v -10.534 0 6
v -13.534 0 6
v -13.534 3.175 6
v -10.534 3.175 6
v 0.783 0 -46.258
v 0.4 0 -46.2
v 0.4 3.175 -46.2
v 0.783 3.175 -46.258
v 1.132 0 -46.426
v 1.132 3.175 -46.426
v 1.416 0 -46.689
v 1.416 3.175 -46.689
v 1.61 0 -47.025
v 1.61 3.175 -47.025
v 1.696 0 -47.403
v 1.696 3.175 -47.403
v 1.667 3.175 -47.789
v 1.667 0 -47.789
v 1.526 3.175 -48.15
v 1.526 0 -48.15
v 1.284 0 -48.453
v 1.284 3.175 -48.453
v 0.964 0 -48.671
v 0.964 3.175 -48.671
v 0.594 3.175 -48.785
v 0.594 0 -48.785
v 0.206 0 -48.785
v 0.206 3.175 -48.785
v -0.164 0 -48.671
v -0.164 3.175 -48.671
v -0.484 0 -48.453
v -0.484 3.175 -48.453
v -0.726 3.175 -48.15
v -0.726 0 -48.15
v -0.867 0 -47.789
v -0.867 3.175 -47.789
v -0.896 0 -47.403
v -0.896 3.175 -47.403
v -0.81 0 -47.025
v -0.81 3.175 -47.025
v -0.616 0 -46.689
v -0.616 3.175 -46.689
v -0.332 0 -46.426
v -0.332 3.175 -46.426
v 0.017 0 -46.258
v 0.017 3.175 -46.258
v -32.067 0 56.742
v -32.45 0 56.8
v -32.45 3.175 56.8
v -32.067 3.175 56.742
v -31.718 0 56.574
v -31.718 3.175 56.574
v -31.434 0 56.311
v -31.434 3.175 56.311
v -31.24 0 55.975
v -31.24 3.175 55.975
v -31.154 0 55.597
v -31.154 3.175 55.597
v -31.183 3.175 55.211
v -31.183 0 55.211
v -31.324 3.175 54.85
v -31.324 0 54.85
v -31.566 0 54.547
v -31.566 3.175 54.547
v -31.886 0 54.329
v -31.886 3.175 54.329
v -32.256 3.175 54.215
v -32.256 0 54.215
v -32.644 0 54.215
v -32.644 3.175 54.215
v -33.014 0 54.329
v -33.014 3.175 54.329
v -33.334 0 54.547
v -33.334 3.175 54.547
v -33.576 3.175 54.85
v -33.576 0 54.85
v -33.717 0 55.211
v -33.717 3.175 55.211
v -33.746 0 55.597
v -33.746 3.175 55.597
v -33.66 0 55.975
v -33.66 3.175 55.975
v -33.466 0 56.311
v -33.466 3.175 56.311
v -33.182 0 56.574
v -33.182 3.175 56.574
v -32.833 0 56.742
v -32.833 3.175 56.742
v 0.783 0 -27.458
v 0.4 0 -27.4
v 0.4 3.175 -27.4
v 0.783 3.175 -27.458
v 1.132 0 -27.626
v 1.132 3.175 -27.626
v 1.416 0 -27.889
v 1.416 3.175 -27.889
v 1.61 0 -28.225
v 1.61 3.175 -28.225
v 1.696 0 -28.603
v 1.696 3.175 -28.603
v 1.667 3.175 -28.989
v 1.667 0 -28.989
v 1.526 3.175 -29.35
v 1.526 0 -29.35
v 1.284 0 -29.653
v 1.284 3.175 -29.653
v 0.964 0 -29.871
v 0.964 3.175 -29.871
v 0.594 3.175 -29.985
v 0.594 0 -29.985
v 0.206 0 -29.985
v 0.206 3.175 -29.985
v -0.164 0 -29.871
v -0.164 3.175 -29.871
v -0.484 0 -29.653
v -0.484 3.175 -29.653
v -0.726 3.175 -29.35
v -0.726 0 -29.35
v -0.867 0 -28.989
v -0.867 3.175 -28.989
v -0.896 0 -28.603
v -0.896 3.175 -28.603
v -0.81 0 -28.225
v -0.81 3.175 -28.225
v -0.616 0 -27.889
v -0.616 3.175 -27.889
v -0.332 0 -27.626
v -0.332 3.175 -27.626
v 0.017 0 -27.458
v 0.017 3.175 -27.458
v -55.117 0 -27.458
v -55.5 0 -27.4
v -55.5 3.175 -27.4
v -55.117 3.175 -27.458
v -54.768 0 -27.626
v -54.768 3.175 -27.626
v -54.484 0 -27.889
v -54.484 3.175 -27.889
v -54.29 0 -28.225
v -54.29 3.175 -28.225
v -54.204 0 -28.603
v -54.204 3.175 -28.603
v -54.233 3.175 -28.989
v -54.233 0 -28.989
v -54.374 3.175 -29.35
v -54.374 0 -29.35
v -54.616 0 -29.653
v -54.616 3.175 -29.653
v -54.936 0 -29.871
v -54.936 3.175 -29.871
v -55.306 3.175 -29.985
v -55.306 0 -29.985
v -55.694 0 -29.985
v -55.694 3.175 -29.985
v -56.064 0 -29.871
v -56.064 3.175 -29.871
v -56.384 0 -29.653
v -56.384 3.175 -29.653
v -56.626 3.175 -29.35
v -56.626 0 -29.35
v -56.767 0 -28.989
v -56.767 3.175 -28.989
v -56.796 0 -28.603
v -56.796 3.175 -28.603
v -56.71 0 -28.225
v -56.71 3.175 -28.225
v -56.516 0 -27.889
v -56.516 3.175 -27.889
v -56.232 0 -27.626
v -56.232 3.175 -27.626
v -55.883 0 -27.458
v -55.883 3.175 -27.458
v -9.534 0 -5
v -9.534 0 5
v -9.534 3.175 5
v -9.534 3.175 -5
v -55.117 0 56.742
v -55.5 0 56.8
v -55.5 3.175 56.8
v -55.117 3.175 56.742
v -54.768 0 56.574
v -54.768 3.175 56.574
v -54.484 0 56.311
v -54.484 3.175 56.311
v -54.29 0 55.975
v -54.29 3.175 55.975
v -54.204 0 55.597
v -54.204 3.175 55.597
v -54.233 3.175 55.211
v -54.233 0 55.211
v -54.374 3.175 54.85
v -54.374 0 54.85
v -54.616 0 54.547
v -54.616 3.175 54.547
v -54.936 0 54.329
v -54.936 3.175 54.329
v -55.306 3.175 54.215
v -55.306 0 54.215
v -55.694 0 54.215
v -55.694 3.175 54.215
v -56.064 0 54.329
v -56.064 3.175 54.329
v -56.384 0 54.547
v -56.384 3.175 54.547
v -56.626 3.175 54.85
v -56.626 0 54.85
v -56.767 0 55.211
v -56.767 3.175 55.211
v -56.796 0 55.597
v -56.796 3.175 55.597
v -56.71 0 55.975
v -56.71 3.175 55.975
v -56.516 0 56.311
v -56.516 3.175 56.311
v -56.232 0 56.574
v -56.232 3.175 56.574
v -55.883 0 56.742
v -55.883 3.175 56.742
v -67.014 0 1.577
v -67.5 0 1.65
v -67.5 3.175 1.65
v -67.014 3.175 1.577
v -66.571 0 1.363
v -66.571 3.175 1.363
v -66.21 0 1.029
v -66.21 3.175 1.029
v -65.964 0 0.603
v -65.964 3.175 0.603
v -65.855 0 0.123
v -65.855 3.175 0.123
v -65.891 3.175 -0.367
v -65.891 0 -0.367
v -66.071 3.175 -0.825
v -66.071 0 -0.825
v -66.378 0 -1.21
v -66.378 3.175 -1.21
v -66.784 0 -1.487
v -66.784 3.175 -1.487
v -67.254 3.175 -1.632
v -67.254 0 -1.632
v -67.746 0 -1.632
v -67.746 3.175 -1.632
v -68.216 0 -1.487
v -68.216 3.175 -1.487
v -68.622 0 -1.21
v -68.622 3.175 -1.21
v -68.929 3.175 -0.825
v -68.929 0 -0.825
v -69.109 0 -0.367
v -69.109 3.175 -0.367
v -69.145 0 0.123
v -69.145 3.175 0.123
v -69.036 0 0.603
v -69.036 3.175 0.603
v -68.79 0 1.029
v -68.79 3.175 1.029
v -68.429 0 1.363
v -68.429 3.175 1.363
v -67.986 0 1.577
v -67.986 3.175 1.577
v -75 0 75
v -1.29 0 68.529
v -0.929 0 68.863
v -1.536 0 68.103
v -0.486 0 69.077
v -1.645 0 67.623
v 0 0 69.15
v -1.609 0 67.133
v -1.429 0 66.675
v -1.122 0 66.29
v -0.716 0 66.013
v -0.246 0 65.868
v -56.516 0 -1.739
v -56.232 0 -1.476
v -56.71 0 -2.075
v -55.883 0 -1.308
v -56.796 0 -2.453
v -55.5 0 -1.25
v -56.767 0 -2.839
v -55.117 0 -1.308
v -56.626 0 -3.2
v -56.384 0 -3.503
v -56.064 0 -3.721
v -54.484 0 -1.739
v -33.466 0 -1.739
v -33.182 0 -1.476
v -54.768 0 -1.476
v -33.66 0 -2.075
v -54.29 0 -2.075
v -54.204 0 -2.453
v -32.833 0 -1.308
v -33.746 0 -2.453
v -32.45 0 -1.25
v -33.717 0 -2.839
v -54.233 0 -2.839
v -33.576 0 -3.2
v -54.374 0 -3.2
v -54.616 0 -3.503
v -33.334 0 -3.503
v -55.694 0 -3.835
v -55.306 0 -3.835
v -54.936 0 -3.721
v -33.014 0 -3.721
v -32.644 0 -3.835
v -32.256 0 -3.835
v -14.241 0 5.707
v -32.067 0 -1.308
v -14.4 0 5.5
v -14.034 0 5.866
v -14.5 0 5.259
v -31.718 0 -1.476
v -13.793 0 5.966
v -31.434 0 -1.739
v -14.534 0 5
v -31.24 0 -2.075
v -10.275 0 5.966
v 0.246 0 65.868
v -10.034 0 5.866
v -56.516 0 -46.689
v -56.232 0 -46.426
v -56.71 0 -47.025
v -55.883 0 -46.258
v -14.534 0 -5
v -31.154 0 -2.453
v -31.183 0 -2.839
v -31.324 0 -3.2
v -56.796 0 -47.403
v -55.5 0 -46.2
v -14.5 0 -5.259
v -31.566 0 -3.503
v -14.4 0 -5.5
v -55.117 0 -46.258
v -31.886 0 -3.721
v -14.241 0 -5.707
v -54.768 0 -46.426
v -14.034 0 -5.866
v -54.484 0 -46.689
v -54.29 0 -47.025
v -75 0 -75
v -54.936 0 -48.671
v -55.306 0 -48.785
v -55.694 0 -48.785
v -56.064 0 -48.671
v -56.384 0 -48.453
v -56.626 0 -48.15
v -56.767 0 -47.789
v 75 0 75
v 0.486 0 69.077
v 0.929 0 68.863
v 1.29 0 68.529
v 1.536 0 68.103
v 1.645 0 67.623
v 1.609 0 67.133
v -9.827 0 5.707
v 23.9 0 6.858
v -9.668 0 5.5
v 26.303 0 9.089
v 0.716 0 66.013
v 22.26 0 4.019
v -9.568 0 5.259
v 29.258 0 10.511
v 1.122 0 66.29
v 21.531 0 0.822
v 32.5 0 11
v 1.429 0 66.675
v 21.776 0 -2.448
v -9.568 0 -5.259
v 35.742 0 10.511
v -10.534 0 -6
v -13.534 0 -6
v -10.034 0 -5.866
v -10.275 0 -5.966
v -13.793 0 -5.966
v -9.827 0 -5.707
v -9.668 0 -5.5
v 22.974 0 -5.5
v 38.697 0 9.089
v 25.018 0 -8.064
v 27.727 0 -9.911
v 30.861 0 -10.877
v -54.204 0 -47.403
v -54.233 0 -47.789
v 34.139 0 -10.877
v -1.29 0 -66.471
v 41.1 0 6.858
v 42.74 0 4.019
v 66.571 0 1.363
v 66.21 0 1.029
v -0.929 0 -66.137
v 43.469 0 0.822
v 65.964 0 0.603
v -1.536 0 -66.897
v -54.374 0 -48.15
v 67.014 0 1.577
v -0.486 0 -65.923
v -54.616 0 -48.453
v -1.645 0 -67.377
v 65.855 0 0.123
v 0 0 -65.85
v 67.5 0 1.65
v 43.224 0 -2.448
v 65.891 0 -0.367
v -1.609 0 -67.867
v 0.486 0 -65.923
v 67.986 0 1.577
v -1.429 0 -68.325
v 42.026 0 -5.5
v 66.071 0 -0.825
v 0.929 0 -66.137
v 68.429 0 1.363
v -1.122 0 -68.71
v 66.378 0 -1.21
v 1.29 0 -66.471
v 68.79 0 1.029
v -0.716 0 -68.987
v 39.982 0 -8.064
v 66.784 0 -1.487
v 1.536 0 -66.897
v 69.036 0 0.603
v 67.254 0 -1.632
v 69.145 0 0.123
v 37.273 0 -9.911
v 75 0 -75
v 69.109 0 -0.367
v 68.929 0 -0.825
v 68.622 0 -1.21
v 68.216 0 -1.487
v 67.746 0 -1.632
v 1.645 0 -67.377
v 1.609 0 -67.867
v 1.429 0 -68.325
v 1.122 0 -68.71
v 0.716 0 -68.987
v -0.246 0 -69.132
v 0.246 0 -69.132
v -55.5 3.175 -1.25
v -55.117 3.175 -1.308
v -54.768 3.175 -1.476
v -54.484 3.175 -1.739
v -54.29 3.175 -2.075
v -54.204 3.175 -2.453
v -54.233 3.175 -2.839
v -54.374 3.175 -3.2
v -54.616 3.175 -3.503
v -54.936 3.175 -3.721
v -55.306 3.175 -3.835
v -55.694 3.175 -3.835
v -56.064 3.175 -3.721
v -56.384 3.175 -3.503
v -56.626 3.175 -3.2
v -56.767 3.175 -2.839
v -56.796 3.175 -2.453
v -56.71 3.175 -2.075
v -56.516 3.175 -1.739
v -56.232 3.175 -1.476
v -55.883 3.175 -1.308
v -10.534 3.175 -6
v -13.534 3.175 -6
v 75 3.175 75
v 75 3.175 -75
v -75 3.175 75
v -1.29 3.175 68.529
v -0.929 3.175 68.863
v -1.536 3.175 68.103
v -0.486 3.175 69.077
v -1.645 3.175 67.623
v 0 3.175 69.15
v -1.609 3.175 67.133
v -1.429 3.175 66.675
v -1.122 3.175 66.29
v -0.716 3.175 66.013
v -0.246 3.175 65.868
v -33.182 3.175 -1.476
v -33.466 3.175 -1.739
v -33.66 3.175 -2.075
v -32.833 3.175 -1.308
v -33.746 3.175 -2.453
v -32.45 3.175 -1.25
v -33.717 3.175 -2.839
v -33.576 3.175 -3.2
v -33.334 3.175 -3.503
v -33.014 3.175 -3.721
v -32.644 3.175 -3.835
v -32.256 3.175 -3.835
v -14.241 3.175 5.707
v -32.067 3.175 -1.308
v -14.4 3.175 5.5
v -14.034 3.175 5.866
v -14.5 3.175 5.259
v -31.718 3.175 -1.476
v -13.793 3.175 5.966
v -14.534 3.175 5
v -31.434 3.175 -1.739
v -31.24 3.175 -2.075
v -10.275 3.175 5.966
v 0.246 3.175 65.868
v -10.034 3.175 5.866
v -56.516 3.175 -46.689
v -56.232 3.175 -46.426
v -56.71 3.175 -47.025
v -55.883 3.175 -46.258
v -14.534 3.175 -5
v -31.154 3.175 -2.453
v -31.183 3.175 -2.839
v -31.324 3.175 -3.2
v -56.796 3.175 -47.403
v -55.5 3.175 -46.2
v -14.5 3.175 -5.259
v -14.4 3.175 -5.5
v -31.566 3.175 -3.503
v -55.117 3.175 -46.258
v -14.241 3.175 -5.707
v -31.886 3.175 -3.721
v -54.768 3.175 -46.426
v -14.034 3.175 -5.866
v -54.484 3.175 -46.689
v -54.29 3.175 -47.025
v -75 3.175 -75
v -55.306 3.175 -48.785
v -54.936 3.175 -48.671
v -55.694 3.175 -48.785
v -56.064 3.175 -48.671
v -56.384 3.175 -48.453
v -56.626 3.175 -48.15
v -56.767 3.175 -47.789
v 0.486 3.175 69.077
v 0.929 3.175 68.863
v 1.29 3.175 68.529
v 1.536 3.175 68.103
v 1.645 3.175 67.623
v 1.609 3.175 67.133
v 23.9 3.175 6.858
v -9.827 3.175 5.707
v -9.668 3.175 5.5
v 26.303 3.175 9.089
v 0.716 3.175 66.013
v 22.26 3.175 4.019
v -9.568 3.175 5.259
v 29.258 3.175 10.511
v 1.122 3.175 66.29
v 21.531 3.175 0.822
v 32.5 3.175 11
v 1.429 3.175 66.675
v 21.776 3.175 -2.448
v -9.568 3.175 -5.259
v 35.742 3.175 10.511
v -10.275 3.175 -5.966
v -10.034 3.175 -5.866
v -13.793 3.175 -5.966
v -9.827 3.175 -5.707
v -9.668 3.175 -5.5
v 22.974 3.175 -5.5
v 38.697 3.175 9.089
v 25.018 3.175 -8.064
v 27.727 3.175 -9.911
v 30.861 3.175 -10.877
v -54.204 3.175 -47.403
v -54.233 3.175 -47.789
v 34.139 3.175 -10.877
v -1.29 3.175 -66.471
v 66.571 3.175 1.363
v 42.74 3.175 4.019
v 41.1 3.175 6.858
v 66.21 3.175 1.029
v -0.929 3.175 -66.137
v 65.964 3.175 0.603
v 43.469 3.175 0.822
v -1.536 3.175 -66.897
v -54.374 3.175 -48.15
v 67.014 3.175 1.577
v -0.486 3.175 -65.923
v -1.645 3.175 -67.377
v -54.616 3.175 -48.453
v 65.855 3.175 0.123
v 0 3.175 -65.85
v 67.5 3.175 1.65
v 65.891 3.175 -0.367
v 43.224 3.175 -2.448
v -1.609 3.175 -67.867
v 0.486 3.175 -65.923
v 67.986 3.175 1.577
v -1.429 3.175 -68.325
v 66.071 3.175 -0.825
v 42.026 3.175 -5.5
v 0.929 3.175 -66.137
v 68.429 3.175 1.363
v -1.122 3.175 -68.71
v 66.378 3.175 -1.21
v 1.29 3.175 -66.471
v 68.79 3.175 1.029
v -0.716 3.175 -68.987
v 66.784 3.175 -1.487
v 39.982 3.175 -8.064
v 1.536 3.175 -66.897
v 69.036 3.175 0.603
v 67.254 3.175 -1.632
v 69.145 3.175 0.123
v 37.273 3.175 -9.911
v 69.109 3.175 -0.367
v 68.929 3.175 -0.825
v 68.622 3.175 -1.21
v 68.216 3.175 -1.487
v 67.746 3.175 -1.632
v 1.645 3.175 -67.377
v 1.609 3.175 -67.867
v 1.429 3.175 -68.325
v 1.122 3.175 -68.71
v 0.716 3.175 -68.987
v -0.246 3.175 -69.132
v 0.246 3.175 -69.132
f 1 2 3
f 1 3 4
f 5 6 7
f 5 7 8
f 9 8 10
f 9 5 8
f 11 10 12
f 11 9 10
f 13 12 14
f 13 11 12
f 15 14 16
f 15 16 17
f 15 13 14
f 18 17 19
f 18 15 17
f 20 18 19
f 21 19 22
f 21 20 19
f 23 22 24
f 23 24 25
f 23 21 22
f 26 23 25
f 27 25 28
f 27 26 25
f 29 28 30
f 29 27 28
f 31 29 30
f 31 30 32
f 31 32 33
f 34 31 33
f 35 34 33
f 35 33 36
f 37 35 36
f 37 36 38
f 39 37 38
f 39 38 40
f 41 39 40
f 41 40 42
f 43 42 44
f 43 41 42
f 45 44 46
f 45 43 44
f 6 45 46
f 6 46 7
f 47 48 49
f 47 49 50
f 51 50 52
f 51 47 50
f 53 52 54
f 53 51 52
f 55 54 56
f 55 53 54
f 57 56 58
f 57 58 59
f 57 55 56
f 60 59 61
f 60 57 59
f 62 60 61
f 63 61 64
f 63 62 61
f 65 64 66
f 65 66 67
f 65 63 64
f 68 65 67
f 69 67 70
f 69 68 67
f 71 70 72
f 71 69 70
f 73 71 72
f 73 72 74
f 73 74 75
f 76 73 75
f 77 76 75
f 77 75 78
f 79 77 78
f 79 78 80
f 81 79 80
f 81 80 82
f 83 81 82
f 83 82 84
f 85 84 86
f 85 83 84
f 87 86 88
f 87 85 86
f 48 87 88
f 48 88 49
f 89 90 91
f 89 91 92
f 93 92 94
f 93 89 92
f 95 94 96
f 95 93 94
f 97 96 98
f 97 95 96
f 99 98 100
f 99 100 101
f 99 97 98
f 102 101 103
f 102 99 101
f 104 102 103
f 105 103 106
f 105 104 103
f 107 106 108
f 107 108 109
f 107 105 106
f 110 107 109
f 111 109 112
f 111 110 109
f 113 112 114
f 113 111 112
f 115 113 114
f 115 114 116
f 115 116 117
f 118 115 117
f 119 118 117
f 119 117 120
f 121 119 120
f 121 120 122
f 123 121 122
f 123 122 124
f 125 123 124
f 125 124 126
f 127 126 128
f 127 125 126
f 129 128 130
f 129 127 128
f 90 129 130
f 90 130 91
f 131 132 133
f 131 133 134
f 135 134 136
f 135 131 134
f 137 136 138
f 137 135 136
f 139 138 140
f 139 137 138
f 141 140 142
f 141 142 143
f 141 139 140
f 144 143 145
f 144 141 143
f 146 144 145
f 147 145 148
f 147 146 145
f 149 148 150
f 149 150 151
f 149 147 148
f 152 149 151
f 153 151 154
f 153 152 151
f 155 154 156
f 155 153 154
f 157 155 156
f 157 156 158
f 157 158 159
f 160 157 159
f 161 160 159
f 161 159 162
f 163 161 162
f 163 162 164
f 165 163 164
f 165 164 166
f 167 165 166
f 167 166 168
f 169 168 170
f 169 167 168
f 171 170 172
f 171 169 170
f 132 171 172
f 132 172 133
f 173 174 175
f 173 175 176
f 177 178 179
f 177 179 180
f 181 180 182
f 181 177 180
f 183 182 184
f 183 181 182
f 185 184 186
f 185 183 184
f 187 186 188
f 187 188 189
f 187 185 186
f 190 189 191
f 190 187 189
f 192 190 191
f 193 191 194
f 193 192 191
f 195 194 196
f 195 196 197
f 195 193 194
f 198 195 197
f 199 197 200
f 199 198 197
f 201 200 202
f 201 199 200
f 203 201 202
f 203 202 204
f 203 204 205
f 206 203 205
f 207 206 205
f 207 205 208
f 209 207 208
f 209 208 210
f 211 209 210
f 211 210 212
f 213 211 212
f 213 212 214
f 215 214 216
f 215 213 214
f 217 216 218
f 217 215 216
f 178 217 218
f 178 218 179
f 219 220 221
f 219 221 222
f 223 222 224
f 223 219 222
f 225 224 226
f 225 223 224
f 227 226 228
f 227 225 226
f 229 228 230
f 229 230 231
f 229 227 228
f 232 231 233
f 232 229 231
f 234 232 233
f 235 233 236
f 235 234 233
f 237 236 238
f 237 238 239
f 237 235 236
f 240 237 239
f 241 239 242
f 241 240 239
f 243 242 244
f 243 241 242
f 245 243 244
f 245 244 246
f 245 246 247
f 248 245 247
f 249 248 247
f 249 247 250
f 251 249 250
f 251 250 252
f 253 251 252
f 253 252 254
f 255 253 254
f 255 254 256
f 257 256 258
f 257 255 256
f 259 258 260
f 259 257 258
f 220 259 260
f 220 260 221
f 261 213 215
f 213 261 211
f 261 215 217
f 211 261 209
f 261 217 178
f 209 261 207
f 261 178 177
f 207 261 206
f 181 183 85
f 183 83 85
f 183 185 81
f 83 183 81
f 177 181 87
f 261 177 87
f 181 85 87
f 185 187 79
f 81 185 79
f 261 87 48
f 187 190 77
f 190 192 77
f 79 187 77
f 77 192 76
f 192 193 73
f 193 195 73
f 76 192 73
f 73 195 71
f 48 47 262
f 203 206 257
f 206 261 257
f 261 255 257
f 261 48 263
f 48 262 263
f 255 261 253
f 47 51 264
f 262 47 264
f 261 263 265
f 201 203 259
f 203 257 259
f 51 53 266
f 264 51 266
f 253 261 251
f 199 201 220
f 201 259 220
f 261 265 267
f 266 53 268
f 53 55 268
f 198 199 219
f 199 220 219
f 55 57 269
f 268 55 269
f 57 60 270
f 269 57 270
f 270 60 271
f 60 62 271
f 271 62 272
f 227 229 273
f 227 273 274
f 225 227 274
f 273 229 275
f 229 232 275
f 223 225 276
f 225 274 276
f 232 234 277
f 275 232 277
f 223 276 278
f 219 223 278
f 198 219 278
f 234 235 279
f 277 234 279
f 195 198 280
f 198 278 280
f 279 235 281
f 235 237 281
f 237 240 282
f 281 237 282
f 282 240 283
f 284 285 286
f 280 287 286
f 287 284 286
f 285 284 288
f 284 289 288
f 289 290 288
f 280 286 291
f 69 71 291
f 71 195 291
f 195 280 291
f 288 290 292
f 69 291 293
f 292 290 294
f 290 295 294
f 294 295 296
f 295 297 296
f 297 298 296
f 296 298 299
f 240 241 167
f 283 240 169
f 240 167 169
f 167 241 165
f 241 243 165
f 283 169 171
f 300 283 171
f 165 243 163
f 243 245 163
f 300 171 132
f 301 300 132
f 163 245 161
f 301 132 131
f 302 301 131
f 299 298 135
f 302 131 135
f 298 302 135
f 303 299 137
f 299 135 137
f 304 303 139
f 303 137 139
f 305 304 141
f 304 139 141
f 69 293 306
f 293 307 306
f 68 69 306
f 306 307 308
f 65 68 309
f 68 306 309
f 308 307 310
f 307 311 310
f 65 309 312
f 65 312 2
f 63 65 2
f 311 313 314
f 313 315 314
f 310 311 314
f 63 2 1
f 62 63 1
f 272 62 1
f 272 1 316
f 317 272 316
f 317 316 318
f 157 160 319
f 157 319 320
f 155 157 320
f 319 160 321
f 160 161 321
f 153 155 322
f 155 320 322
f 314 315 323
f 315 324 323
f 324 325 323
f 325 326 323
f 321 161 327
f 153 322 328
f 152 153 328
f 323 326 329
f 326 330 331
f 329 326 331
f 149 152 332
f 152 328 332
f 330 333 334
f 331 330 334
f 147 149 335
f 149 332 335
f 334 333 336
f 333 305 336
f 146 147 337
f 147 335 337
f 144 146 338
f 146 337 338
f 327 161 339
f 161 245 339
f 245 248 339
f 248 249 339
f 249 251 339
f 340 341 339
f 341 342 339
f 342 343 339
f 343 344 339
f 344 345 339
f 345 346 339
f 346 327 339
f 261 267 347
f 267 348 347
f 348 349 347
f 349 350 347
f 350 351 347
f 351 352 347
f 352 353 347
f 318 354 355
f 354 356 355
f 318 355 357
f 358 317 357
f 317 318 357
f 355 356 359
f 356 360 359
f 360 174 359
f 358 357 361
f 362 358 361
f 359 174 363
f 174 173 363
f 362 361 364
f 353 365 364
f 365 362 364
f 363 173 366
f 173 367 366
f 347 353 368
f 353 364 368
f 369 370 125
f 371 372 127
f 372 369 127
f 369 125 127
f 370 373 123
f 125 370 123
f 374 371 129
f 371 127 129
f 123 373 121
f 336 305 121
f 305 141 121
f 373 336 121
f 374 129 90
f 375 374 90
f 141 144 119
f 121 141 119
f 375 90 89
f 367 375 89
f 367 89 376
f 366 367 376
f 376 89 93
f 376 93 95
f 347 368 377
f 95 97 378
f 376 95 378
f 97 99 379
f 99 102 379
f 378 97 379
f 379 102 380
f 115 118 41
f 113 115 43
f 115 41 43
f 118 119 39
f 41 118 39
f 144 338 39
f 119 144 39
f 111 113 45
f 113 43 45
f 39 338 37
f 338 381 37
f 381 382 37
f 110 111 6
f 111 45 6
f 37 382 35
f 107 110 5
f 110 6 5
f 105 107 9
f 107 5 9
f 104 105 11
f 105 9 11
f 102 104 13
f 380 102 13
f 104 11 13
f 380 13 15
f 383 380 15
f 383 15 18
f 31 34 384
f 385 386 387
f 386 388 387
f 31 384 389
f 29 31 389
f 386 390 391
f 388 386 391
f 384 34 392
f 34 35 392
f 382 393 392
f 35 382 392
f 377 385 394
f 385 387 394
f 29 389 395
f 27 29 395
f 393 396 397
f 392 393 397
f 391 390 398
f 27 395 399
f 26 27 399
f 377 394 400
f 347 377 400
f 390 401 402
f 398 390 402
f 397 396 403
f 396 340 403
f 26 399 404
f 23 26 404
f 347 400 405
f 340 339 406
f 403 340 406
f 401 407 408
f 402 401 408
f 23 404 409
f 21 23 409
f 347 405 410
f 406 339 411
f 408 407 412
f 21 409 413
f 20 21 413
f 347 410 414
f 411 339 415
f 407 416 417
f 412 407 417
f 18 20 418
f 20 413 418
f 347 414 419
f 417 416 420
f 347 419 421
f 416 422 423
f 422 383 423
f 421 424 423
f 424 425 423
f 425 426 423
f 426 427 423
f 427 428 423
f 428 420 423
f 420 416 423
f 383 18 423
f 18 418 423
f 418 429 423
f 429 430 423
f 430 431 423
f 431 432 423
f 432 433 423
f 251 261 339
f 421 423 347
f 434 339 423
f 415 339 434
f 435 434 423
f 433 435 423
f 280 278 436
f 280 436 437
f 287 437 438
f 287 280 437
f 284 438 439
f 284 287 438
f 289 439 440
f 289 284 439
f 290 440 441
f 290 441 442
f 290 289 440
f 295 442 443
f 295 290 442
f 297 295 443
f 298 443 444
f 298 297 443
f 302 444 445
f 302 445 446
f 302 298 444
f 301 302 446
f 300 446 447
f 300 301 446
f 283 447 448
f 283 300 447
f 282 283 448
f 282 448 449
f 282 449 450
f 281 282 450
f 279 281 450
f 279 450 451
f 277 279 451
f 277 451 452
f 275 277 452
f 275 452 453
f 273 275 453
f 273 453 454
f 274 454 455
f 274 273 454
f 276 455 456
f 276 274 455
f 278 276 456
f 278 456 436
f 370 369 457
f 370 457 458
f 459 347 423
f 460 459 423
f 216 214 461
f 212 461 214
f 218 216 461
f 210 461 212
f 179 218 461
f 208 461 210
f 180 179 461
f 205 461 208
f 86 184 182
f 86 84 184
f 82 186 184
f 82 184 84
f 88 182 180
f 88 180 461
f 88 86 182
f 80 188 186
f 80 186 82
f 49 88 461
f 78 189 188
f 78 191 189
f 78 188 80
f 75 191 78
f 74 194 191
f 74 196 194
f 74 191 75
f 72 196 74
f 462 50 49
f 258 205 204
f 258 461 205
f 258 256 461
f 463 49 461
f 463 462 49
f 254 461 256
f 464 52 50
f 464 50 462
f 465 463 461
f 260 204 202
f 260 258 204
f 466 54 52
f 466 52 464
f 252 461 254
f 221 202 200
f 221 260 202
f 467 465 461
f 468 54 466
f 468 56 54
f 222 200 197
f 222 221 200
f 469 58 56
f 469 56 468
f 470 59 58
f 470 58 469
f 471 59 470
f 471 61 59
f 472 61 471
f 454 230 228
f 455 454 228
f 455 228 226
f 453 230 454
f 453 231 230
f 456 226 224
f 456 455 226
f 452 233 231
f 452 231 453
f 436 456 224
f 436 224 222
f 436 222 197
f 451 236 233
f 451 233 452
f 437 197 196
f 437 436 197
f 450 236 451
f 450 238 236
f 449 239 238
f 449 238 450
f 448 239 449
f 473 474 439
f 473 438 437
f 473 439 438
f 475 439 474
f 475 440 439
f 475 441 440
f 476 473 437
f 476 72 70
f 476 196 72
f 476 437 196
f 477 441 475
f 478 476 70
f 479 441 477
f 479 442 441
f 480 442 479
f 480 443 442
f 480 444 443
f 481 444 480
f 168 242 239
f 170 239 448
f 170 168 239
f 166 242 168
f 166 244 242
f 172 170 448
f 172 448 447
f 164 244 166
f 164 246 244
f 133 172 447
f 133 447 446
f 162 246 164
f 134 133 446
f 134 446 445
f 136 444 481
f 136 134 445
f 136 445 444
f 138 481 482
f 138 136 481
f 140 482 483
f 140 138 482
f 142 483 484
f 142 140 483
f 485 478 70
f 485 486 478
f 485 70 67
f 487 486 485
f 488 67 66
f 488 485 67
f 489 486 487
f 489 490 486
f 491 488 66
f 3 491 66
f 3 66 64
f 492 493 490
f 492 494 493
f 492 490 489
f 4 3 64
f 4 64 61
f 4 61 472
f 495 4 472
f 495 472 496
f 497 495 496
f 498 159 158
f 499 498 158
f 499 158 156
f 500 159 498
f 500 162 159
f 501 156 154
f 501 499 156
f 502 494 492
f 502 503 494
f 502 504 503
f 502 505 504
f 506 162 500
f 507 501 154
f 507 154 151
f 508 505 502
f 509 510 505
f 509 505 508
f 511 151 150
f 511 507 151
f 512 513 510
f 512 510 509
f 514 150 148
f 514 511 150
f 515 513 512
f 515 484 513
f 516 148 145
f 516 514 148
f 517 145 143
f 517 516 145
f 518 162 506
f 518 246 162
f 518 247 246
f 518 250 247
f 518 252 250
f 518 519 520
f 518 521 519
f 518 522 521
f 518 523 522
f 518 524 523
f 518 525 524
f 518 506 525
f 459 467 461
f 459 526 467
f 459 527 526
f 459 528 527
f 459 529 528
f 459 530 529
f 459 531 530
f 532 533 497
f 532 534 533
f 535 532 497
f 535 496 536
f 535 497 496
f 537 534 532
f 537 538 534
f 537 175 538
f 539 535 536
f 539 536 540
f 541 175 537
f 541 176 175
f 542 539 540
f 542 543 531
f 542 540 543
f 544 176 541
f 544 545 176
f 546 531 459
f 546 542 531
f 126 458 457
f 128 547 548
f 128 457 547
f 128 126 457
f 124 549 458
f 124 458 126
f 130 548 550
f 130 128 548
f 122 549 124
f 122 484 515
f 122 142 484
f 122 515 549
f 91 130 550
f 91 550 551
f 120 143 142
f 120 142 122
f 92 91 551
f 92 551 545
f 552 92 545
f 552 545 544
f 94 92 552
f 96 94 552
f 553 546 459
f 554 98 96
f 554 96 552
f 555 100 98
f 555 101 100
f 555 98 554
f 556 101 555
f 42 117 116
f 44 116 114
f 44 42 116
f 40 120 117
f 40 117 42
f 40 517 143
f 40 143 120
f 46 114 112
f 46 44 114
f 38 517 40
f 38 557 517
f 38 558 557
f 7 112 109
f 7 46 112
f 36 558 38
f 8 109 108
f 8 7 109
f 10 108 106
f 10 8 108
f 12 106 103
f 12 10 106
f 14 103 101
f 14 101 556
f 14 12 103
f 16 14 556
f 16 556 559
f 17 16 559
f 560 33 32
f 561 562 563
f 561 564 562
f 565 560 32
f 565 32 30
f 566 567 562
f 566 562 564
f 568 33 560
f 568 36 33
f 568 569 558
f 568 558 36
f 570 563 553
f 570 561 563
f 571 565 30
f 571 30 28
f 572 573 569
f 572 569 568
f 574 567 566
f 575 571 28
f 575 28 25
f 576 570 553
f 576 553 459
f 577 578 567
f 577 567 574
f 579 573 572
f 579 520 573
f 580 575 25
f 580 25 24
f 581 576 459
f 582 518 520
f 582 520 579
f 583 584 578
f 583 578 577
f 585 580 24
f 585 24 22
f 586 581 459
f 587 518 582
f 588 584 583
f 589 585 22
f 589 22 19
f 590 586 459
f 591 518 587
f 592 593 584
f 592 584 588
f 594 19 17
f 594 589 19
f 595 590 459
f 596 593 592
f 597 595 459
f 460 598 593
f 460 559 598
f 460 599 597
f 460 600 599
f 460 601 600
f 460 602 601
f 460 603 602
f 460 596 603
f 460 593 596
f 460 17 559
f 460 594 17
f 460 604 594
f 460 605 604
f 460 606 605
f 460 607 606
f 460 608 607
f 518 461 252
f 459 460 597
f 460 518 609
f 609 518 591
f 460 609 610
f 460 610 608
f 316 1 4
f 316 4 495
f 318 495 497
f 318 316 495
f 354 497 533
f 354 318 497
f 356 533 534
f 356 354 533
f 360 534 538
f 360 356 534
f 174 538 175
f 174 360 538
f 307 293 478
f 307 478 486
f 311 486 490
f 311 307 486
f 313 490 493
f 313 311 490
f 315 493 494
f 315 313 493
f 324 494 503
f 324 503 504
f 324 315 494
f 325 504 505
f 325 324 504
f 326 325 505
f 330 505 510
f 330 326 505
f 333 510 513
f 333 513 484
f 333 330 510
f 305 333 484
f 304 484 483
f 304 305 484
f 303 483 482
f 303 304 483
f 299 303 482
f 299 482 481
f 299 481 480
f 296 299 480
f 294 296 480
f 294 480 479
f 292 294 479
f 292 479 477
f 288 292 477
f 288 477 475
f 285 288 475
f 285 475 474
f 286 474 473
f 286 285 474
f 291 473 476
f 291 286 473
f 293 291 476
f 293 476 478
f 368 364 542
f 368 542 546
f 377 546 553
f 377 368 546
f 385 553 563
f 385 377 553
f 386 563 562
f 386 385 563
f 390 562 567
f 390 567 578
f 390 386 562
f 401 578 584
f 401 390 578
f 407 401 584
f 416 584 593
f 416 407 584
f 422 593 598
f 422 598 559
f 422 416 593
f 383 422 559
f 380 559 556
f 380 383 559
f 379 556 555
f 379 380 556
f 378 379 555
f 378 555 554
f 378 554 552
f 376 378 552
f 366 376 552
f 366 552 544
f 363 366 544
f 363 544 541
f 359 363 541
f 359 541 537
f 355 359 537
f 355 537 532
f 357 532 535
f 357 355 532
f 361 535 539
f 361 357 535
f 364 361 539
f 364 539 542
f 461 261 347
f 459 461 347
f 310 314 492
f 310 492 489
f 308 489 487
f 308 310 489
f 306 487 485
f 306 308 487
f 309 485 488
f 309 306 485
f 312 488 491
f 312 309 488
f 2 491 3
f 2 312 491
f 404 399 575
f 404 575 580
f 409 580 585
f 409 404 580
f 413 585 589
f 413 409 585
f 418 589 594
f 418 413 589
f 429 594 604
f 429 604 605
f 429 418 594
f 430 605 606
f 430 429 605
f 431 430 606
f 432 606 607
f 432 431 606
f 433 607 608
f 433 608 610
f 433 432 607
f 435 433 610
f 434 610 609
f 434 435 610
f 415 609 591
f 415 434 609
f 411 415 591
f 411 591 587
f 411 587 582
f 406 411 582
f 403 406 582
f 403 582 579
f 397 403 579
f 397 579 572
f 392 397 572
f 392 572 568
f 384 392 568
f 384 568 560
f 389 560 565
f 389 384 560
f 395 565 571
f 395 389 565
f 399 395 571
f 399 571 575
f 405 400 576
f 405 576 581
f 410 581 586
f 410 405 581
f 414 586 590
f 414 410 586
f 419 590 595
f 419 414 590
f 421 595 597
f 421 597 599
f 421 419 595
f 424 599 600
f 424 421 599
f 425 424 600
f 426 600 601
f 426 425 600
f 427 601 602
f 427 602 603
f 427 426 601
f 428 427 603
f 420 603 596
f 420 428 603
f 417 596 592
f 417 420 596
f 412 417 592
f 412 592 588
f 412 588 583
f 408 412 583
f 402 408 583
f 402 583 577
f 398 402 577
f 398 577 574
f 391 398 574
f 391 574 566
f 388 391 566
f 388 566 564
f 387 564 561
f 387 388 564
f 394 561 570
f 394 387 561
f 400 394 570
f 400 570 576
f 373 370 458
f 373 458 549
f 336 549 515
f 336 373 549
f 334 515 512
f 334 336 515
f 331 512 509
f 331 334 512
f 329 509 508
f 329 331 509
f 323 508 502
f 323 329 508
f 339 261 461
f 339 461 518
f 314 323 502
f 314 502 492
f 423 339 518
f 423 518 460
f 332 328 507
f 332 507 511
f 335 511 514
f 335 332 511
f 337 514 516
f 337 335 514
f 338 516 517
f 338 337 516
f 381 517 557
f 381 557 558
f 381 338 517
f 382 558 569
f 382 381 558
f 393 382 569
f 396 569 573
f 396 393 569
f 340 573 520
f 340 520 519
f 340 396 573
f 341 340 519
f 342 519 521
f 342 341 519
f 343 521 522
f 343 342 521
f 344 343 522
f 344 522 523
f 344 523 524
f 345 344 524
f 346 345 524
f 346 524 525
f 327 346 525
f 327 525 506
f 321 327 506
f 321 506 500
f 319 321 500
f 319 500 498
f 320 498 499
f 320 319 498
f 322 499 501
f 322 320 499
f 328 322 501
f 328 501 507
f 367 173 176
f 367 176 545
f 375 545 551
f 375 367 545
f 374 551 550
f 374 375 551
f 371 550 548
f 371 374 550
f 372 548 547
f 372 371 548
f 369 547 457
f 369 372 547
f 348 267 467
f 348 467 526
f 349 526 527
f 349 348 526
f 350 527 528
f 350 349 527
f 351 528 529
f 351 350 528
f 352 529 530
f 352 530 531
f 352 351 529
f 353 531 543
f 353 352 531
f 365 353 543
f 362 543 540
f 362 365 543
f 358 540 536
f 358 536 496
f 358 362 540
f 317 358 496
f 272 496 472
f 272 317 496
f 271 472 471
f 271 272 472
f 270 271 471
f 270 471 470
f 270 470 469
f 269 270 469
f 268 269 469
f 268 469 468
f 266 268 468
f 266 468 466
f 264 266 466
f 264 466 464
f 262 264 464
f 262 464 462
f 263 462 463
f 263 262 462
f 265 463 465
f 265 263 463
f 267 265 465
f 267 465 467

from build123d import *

# Parameters (mm, degrees)
SKETCH1_W           = 150
SKETCH1_H           = 150
SKETCH1_R           = 1.65
SKETCH1_R_2         = 1.3
SKETCH1_R_3         = 11
BOSS_EXTRUDE1_DEPTH = 3.175


with BuildPart() as part:
    # Sketch1 → Boss-Extrude1 (new body)
    with BuildSketch(Plane(origin=(0, 0, 0), x_dir=(1, 0, 0), z_dir=(0, 1, 0))):
        Rectangle(SKETCH1_W, SKETCH1_H)
        with Locations(Location((-67.5, 0, 0), (0, 0, 270))):
            Circle(SKETCH1_R, mode=Mode.SUBTRACT)
        with Locations(Location((0, 67.5, 0), (0, 0, 270))):
            Circle(SKETCH1_R, mode=Mode.SUBTRACT)
        with Locations(Location((67.5, 0, 0), (0, 0, 270))):
            Circle(SKETCH1_R, mode=Mode.SUBTRACT)
        with Locations(Location((0, -67.5, 0), (0, 0, 270))):
            Circle(SKETCH1_R, mode=Mode.SUBTRACT)
        with Locations(Location((-55.5, -55.5, 0), (0, 0, 270))):
            Circle(SKETCH1_R_2, mode=Mode.SUBTRACT)
        with Locations(Location((-32.45, -55.5, 0), (0, 0, 270))):
            Circle(SKETCH1_R_2, mode=Mode.SUBTRACT)
        with Locations(Location((-32.45, 2.55, 0), (0, 0, 270))):
            Circle(SKETCH1_R_2, mode=Mode.SUBTRACT)
        with Locations(Location((-55.5, 2.55, 0), (0, 0, 270))):
            Circle(SKETCH1_R_2, mode=Mode.SUBTRACT)
        with Locations(Location((0.4, 47.5, 0), (0, 0, 270))):
            Circle(SKETCH1_R_2, mode=Mode.SUBTRACT)
        with Locations(Location((0.4, 28.7, 0), (0, 0, 270))):
            Circle(SKETCH1_R_2, mode=Mode.SUBTRACT)
        with Locations(Location((-55.5, 47.5, 0), (0, 0, 270))):
            Circle(SKETCH1_R_2, mode=Mode.SUBTRACT)
        with Locations(Location((-55.5, 28.7, 0), (0, 0, 270))):
            Circle(SKETCH1_R_2, mode=Mode.SUBTRACT)
        with Locations(Location((32.5, 0, 0), (0, 0, 270))):
            Circle(SKETCH1_R_3, mode=Mode.SUBTRACT)
        with BuildLine():
            Line((-13.534289991, -6), (-10.534289991, -6))
            ThreePointArc((-10.534289991, -6), (-9.82718321, -5.707106781), (-9.534289991, -5))
            Line((-9.534289991, -5), (-9.534289991, 5))
            ThreePointArc((-9.534289991, 5), (-9.82718321, 5.707106781), (-10.534289991, 6))
            Line((-10.534289991, 6), (-13.534289991, 6))
            ThreePointArc((-13.534289991, 6), (-14.241396772, 5.707106781), (-14.534289991, 5))
            Line((-14.534289991, 5), (-14.534289991, -5))
            ThreePointArc((-14.534289991, -5), (-14.241396772, -5.707106781), (-13.534289991, -6))
        make_face(mode=Mode.SUBTRACT)
    extrude(amount=BOSS_EXTRUDE1_DEPTH)


solid = part.part
